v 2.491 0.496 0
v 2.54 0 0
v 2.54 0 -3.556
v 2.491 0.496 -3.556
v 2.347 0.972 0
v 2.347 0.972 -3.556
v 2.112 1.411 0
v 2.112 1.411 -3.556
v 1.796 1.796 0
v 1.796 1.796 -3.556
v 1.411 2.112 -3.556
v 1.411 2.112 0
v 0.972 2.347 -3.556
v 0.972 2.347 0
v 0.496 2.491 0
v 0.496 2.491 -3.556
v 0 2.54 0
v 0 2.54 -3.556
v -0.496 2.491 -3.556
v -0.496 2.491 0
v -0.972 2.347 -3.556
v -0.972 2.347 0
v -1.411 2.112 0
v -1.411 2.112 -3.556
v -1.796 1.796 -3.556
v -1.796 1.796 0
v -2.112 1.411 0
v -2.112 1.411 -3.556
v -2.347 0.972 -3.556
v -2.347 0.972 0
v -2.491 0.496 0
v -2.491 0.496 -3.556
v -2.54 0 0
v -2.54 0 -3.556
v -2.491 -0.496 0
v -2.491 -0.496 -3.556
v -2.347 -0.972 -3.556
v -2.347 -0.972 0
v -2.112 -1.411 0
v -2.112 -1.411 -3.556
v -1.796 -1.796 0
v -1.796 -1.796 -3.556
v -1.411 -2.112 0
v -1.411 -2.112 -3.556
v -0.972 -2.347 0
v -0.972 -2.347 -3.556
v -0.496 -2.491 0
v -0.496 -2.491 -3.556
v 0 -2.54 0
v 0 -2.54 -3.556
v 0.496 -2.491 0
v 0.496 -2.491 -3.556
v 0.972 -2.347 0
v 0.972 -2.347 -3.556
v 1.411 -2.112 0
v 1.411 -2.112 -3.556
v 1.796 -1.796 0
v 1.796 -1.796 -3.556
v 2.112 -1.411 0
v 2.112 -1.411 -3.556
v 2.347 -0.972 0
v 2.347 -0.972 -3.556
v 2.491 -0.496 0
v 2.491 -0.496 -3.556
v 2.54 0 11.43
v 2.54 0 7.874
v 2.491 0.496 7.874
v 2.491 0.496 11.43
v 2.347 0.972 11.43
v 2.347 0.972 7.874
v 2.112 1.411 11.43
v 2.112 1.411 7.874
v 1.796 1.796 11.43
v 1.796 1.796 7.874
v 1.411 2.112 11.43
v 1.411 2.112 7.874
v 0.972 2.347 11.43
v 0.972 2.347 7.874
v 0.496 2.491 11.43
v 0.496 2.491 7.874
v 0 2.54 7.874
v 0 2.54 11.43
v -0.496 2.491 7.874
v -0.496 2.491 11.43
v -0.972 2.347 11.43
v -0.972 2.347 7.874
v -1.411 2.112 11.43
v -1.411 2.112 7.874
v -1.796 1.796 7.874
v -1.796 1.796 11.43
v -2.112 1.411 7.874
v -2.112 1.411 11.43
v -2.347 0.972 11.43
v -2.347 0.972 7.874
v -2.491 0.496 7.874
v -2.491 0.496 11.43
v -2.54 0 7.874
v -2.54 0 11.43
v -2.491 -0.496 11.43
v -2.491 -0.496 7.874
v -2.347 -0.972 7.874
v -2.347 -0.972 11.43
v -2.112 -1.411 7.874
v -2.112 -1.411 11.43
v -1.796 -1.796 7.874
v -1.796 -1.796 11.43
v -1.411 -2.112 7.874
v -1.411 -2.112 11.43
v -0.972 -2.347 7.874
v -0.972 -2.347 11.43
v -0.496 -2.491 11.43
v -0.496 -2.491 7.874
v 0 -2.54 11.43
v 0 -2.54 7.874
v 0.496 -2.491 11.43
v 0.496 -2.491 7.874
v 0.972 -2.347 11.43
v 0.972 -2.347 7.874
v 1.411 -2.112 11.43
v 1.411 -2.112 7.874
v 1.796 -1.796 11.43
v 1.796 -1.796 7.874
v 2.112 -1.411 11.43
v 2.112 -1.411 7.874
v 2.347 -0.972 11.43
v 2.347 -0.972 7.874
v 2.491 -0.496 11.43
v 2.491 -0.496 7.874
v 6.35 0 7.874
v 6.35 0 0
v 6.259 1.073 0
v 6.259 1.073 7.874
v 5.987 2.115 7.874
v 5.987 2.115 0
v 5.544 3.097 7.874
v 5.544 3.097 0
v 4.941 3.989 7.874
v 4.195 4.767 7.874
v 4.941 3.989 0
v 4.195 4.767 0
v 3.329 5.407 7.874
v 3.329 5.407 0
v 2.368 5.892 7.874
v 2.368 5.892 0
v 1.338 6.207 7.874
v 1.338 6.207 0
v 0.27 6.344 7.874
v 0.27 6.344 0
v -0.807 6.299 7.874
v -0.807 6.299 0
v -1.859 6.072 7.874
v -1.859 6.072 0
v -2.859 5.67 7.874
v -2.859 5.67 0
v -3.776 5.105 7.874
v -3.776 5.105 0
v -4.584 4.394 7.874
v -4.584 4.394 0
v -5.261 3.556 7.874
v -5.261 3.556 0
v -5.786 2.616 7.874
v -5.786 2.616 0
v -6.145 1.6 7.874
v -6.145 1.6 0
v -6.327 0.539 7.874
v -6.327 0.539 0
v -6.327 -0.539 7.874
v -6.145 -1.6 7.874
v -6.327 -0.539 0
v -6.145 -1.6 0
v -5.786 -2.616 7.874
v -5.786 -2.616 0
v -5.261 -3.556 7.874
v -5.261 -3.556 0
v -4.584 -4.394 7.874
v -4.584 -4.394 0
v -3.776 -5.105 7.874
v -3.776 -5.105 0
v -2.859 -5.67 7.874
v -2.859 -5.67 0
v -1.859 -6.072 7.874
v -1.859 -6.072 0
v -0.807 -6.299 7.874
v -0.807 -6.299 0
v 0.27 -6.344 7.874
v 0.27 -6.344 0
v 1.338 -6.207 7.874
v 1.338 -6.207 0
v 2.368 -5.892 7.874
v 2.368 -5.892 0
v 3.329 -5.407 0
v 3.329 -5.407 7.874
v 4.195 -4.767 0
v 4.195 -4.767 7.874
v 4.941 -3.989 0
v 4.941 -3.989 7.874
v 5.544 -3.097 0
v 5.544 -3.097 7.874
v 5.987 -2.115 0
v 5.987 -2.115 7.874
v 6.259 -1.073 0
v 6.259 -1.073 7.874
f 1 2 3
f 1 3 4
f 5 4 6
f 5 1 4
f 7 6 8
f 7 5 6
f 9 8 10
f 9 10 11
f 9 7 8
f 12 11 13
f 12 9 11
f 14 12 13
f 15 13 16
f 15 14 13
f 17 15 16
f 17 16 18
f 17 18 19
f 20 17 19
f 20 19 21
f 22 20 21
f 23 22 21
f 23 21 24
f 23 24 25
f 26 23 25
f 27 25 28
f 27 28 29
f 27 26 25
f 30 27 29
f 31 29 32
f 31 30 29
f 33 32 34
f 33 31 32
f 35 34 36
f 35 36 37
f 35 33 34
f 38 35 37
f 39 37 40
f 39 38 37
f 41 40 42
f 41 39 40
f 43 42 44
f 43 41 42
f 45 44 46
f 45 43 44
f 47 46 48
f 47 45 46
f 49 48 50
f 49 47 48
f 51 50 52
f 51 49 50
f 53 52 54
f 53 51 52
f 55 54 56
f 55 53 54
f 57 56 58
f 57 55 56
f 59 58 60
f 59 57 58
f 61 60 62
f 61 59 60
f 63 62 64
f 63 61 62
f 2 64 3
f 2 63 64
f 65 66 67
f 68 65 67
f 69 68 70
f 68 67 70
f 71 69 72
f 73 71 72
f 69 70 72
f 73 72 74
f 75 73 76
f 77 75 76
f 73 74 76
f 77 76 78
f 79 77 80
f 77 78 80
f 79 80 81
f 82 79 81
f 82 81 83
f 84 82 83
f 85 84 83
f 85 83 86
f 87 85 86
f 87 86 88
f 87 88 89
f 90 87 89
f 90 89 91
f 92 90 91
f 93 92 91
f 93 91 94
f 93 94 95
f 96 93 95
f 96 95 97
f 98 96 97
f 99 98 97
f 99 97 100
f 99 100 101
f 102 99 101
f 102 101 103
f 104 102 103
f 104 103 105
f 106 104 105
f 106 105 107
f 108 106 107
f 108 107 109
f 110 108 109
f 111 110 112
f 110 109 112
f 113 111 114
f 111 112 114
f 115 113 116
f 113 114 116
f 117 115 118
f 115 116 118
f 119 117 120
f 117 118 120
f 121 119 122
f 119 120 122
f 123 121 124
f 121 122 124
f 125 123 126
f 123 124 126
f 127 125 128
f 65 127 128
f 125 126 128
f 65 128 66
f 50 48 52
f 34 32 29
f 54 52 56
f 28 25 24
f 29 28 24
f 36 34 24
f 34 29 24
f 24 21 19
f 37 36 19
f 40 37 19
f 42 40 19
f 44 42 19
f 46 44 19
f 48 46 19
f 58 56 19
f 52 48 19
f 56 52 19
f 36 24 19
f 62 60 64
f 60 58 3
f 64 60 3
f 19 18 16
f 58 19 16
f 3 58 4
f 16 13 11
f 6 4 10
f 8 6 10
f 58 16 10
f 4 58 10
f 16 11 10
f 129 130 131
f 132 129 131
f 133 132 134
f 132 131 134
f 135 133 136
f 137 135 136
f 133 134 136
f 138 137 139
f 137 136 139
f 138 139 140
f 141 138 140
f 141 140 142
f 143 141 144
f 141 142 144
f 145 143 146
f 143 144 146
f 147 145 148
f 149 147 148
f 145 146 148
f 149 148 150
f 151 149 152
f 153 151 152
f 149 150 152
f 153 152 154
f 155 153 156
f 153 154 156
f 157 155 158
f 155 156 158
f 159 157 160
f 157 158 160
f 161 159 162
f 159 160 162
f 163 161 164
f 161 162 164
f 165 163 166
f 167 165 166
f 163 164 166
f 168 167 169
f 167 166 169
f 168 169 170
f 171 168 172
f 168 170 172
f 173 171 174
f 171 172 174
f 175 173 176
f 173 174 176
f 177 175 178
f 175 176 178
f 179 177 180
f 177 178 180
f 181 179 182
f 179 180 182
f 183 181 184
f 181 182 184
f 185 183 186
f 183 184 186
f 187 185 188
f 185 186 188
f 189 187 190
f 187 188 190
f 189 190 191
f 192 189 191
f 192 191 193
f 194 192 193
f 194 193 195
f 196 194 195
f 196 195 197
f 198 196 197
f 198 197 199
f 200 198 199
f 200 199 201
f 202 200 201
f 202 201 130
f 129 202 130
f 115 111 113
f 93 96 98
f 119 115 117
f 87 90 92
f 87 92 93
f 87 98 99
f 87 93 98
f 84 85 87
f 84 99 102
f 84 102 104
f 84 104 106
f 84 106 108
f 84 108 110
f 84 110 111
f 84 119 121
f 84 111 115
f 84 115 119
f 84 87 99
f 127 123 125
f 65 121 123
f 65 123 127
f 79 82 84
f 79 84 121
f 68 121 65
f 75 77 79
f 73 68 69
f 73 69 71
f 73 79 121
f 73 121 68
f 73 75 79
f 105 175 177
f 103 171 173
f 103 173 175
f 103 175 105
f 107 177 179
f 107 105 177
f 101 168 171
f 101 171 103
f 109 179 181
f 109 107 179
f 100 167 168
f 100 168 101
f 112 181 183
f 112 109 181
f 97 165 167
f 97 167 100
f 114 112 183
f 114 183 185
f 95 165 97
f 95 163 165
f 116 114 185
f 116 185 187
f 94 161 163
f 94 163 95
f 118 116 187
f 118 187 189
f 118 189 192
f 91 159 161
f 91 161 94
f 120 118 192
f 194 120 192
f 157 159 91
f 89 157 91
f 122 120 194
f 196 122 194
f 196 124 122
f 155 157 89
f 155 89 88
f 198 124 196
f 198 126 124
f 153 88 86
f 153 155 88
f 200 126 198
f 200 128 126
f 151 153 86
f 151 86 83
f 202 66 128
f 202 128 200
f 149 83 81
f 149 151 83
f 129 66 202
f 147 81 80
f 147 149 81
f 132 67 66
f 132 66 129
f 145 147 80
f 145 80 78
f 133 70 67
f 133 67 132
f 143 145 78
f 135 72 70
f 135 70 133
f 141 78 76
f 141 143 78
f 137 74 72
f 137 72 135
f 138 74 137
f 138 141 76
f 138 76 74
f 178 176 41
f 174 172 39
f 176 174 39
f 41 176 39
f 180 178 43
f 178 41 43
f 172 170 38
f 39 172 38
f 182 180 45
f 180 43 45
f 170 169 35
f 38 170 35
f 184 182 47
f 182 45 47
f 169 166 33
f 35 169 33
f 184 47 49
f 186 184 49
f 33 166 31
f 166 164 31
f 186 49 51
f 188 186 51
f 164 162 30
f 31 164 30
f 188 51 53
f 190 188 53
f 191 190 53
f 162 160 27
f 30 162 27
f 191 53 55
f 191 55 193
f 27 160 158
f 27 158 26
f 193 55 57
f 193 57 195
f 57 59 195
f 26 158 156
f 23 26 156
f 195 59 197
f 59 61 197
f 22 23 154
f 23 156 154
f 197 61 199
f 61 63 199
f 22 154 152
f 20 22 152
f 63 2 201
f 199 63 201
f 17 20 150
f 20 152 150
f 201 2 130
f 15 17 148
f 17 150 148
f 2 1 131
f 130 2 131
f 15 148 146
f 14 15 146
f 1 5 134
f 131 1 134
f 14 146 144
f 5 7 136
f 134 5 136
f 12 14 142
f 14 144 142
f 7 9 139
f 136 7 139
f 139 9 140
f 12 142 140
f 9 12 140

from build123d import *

# Parameters (mm, degrees)
F0_R     = 6.35
F0_R_2   = 2.54
F1_DEPTH = 7.874
F2_R     = 2.54
F3_DEPTH = 11.43
F4_R     = 2.54
F5_DEPTH = 3.556


with BuildPart() as f1:
    # F0 (on Top) → F1 (new body)
    with BuildSketch(Plane.XY):
        Circle(F0_R)
        Circle(F0_R_2, mode=Mode.SUBTRACT)
    extrude(amount=F1_DEPTH)

    # F2 (on Top) → F3 (join)
    with BuildSketch(Plane.XY):
        Circle(F2_R)
    extrude(amount=F3_DEPTH)

    # F4 (on Top) → F5 (join)
    with BuildSketch(Plane.XY):
        Circle(F4_R)
    extrude(amount=-F5_DEPTH)


solid = f1.part
